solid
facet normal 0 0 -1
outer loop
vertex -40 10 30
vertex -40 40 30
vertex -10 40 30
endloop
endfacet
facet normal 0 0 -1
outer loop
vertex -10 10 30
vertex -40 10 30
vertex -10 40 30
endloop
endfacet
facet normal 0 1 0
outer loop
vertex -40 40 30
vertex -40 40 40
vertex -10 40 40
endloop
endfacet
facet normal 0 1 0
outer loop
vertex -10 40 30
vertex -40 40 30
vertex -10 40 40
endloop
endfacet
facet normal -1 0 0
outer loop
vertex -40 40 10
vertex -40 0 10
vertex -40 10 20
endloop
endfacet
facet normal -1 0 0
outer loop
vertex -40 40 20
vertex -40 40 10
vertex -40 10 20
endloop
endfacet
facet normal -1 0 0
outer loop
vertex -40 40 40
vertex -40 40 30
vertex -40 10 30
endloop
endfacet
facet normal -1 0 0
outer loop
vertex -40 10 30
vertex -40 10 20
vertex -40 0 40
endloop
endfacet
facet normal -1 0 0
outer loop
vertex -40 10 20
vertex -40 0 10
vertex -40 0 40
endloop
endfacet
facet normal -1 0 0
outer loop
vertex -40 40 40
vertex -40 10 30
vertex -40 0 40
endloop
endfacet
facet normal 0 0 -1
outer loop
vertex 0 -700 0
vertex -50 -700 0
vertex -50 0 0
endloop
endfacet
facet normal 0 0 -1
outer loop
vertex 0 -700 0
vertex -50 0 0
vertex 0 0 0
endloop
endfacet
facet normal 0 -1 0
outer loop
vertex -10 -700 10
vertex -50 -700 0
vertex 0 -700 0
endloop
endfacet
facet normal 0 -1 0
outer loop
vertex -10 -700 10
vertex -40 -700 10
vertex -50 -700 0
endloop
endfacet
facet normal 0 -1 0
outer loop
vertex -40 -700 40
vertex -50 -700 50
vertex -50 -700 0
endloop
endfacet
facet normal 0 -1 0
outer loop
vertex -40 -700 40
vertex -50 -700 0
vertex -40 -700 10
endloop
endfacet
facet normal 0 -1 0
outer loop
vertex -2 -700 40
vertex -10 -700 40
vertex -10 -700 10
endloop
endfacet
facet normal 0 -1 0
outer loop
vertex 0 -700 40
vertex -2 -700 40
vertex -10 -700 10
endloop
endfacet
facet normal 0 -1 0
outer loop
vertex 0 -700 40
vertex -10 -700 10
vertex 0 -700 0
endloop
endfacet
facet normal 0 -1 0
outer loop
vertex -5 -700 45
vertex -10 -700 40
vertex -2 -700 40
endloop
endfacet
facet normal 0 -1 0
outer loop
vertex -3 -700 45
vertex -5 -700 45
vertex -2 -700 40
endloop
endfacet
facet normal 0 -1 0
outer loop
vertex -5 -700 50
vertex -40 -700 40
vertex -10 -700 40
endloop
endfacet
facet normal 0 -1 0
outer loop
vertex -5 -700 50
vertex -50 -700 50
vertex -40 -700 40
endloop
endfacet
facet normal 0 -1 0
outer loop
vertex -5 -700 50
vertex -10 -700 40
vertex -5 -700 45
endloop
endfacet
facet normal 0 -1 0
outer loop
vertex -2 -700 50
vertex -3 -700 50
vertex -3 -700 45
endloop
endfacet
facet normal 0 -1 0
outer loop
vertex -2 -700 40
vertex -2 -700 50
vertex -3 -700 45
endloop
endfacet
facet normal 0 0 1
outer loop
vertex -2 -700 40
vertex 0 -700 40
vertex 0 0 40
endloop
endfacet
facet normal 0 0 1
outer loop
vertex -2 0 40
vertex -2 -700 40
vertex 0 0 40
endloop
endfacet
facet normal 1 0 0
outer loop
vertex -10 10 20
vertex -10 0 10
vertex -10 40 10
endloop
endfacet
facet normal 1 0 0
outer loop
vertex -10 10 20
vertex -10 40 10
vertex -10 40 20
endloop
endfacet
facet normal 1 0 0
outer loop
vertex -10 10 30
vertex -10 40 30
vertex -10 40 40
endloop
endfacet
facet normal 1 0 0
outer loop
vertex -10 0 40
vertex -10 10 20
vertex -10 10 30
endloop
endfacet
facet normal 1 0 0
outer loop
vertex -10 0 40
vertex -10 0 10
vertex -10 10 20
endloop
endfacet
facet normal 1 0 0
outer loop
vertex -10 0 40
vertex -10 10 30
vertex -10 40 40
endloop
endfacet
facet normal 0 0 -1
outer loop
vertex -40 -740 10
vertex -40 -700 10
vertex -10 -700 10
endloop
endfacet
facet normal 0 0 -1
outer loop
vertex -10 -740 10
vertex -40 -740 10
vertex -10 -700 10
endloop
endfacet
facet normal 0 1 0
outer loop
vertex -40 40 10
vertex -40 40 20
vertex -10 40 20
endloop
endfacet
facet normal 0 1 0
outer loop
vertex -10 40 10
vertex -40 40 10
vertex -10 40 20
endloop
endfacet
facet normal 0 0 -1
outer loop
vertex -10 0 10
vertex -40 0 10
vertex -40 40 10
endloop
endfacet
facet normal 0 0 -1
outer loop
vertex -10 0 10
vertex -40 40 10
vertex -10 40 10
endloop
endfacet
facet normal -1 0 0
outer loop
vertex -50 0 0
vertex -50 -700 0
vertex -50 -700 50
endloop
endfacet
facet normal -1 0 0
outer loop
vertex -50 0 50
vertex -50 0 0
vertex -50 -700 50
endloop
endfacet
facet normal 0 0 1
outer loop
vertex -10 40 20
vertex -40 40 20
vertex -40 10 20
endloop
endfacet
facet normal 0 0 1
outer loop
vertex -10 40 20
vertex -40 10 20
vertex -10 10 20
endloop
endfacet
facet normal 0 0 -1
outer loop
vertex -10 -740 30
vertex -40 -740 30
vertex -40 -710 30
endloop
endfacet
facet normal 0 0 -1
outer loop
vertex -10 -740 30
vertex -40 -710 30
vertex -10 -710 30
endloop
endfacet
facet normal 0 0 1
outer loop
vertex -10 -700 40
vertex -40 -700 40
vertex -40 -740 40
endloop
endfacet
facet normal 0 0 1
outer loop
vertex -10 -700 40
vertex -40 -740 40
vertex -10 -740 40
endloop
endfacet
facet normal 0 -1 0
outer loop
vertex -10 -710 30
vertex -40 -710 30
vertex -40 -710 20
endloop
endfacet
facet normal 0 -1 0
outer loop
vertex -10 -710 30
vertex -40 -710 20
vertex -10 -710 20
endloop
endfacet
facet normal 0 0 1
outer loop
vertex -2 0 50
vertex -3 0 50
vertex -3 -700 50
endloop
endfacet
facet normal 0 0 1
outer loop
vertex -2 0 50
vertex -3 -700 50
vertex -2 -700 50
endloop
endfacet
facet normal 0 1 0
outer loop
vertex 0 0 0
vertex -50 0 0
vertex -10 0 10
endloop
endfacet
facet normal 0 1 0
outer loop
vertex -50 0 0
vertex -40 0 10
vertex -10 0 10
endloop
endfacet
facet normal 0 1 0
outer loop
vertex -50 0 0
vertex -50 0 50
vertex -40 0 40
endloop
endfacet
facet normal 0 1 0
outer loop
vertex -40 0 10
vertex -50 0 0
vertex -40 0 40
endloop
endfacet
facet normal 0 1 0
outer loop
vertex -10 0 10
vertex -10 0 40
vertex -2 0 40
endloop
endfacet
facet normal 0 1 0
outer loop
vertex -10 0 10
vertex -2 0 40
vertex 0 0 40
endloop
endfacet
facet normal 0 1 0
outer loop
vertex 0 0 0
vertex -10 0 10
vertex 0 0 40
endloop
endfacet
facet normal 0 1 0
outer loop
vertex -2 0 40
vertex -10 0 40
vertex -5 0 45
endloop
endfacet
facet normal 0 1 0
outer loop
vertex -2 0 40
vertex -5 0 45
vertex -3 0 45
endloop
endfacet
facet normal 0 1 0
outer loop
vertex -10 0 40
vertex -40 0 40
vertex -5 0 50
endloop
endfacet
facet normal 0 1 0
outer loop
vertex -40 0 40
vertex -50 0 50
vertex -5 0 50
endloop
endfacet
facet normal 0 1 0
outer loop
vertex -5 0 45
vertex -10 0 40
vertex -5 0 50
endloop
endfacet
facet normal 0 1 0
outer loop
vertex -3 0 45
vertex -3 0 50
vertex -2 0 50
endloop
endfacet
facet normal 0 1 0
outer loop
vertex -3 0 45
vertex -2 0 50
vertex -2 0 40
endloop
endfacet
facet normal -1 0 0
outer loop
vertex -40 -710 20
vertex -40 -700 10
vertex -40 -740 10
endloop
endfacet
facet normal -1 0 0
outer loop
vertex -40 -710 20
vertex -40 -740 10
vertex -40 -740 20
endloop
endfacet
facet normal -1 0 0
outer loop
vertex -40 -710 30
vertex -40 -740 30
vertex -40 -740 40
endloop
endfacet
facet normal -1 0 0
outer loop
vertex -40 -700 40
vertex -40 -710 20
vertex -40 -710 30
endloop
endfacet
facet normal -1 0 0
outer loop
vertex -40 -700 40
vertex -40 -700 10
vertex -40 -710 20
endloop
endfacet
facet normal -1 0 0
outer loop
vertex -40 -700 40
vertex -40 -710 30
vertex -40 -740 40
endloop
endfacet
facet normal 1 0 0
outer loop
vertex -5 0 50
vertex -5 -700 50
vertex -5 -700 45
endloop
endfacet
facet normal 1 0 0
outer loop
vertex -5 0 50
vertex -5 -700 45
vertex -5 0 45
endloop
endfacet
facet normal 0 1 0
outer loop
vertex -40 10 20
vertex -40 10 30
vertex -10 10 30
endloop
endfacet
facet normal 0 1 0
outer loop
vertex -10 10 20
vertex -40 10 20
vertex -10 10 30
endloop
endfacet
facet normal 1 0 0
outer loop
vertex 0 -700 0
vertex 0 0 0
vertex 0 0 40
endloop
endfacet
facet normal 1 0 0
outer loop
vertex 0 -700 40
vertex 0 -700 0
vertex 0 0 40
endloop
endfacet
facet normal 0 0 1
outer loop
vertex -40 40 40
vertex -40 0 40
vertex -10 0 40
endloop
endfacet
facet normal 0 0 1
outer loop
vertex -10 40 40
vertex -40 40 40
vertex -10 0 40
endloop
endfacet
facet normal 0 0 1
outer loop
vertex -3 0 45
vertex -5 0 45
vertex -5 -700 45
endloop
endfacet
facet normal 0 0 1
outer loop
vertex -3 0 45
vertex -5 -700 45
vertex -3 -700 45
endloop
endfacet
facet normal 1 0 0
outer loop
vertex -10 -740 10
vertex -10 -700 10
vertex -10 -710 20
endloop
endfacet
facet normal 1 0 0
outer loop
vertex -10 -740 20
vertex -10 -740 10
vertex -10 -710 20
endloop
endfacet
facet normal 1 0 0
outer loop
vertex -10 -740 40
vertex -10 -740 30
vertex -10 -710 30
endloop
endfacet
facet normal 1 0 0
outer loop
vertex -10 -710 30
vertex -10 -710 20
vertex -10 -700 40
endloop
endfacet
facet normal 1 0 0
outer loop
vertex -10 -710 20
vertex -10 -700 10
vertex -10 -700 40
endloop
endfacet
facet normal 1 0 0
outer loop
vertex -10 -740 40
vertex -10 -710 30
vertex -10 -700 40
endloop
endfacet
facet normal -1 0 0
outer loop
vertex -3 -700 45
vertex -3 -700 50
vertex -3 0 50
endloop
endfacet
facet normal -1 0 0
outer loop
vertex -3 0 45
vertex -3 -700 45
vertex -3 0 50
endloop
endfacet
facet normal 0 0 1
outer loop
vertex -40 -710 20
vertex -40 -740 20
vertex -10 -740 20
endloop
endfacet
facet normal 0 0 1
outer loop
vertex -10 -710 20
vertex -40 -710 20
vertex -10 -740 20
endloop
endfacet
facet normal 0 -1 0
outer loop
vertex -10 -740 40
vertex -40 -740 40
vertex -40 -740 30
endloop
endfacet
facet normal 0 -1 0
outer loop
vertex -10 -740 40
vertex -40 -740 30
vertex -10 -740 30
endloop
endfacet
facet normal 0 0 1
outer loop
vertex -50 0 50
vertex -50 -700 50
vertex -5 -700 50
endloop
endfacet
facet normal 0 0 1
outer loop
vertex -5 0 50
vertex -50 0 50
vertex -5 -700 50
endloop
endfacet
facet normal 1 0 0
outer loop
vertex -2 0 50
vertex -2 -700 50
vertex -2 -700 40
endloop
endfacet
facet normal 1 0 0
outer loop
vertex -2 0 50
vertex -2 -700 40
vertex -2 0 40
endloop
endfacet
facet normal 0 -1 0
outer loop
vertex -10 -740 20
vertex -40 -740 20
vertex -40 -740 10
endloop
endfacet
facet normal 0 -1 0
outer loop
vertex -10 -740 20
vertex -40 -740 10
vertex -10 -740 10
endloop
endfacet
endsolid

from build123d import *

# Parameters (mm, degrees)
F0_W      = 50
F0_H      = 50
F1_DEPTH  = 700
F3_W      = 30
F3_H      = 30
F4_DEPTH  = 40
F5_W      = 30
F5_H      = 10
F6_DEPTH  = 30
F7_W      = 700
F7_H      = 10
F8_DEPTH  = 2
F9_W      = 2
F9_H      = 700
F10_DEPTH = 5


# Not quite as in the source:
# - a pattern or mirror of a feature is missing from the dataset's text; its kind, count and spacing are read off the source's solid


with BuildPart() as f1:
    # F0 (on Front) → F1 (new body)
    with BuildSketch(Plane.XZ):
        with Locations((-25, 25)):
            Rectangle(F0_W, F0_H)
    extrude(amount=F1_DEPTH)

    # F3 (on face) → F4 (join)
    with BuildSketch(Plane.XZ.offset(700)):
        with Locations((-25, 25)):
            Rectangle(F3_W, F3_H)
    f4 = extrude(amount=F4_DEPTH)

    # F4_copies: F4 across plane
    add(f4.mirror(Plane.ZX.offset(-350)))

    # F5 (on face) → F6 (cut)
    with BuildSketch(Plane.XZ.offset(740)):
        with Locations((-25, 25)):
            Rectangle(F5_W, F5_H)
    f6 = extrude(amount=-F6_DEPTH, mode=Mode.SUBTRACT)

    # F6_copies: F6 across plane
    add(f6.mirror(Plane.ZX.offset(-350)), mode=Mode.SUBTRACT)

    # F7 (on face) → F8 (cut)
    with BuildSketch(Plane.YZ):
        with Locations((-350, 45)):
            Rectangle(F7_W, F7_H)
    extrude(amount=-F8_DEPTH, mode=Mode.SUBTRACT)

    # F9 (on face) → F10 (cut)
    with BuildSketch(Plane.XY.offset(50)):
        with Locations((-4, -350)):
            Rectangle(F9_W, F9_H)
    extrude(amount=-F10_DEPTH, mode=Mode.SUBTRACT)


solid = f1.part
